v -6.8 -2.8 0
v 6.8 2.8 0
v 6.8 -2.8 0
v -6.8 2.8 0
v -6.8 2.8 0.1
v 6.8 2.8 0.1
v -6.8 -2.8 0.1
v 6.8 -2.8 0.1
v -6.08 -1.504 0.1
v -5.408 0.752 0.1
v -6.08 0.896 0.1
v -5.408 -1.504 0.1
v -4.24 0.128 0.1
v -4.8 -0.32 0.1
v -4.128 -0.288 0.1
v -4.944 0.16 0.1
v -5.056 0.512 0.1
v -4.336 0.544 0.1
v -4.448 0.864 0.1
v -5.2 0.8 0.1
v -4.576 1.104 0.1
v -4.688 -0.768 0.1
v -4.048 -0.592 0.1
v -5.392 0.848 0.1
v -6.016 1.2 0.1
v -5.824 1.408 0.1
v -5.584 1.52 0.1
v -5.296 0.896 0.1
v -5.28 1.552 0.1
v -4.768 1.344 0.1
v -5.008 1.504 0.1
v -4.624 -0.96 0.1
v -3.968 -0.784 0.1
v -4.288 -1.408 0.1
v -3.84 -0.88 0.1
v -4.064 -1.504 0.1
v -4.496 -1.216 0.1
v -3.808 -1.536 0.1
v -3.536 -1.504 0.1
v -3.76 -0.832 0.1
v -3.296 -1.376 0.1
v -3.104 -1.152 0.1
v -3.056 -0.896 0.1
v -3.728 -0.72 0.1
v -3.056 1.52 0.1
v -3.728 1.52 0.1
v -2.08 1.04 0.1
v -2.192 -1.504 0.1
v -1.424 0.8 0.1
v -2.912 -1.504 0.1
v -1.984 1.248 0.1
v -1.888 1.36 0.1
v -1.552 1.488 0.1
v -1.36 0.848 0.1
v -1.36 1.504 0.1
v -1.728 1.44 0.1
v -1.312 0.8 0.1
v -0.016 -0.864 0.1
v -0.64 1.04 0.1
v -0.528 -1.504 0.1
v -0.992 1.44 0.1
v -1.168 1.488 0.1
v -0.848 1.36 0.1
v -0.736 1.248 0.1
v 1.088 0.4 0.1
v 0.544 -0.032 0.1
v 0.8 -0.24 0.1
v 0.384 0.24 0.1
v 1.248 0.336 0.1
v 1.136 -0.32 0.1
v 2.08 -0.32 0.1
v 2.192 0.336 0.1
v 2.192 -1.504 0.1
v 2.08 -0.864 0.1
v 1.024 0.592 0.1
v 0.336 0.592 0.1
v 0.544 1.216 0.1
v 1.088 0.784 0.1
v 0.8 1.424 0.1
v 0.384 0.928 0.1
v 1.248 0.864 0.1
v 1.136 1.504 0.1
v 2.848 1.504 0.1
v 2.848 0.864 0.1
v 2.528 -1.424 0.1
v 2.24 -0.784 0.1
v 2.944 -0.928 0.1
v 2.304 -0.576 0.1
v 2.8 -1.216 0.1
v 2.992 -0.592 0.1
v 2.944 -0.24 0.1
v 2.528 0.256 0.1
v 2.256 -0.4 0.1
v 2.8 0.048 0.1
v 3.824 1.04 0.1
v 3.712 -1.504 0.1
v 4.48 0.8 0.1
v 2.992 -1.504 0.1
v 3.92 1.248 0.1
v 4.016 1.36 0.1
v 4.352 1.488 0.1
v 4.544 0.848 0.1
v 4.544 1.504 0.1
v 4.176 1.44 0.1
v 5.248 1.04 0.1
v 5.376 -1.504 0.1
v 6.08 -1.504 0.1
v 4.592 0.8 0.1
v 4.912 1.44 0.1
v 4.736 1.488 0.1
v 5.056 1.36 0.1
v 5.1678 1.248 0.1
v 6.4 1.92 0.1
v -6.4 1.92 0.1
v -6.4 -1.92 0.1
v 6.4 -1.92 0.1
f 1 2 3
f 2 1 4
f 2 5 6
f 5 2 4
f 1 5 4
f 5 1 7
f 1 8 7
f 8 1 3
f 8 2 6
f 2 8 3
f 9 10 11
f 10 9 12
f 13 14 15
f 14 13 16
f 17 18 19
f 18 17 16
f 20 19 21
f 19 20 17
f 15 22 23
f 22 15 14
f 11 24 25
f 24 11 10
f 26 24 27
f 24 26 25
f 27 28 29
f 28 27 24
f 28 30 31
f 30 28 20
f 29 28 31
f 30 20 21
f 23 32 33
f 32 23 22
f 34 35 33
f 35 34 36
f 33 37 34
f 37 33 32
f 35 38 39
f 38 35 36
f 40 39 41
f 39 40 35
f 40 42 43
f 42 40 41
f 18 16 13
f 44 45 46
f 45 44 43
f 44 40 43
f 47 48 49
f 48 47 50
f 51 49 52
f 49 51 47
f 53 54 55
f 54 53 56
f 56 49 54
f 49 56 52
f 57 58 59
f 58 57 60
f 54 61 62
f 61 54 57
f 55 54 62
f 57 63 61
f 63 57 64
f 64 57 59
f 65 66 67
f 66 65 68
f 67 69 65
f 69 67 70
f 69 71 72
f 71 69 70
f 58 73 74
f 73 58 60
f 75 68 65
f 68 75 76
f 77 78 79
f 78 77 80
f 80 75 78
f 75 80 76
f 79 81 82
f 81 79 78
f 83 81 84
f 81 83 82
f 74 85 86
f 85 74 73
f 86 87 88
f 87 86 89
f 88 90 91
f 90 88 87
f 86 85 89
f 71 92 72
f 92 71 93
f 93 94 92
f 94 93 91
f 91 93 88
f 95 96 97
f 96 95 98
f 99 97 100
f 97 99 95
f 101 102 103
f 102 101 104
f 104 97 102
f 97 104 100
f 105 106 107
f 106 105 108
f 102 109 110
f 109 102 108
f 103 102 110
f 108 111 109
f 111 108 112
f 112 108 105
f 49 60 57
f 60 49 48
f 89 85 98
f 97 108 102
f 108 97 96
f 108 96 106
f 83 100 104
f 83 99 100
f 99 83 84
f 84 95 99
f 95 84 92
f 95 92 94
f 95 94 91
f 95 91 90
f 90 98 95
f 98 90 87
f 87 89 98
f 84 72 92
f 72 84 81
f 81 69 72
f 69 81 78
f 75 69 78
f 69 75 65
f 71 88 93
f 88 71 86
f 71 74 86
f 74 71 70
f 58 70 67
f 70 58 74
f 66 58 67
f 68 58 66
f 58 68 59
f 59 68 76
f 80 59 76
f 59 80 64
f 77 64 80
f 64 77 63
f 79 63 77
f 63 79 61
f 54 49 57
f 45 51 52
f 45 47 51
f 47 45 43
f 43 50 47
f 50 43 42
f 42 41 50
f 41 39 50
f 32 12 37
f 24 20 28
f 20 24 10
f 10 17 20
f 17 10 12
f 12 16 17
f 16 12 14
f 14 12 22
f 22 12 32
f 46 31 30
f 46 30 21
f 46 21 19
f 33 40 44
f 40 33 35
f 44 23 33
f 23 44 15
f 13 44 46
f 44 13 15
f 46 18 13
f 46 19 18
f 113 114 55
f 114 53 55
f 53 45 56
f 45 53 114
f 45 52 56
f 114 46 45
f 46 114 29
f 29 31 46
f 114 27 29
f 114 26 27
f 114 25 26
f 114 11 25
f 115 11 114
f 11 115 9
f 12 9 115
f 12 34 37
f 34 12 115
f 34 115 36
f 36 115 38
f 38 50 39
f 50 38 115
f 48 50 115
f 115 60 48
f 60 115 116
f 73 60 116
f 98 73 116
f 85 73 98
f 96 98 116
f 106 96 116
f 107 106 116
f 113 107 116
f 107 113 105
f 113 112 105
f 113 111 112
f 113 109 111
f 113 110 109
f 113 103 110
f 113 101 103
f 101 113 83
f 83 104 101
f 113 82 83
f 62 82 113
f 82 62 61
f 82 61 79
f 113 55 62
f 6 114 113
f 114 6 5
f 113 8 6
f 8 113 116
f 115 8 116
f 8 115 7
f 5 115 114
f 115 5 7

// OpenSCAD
// file: ../p/logo-nasa.scad
use <../lib.scad>
function ldraw_lib__logo_nasa() = [
// 0 Logo NASA Worm Logo
// 0 Name: logo-nasa.dat
// 0 Author: Takeshi Takahashi [RainbowDolphin]
// 0 !LDRAW_ORG Primitive UPDATE 2022-06
// 0 !LICENSE Licensed under CC BY 2.0 and CC BY 4.0 : see CAreadme.txt
// 
// 0 BFC CERTIFY CCW
  [0,"BFC","CERTIFY"],
  [0,"BFC","CCW"],
// 
// 0 !HISTORY 2022-04-22 [RainbowDolphin] Pattern extracted and resized from 10202p02 by Orion Pobursky [OrionP]
// 0 !HISTORY 2022-12-20 [PTadmin] Official Update 2022-06
// 
// 
// 4 16 -38 0 -9.4 -33.8 0 -9.4 -33.8 0 4.7 -38 0 5.6
  [4,16,-38,0,-9.4,-33.8,0,-9.4,-33.8,0,4.7,-38,0,5.6],
// 4 16 -26.5 0 .8 -30.9 0 1 -30 0 -2 -25.8 0 -1.8
  [4,16,-26.5,0,.8,-30.9,0,1,-30,0,-2,-25.8,0,-1.8],
// 4 16 -31.6 0 3.2 -30.9 0 1 -27.1 0 3.4 -27.8 0 5.4
  [4,16,-31.6,0,3.2,-30.9,0,1,-27.1,0,3.4,-27.8,0,5.4],
// 4 16 -32.5 0 5 -31.6 0 3.2 -27.8 0 5.4 -28.6 0 6.9
  [4,16,-32.5,0,5,-31.6,0,3.2,-27.8,0,5.4,-28.6,0,6.9],
// 4 16 -25.8 0 -1.8 -30 0 -2 -29.3 0 -4.8 -25.3 0 -3.7
  [4,16,-25.8,0,-1.8,-30,0,-2,-29.3,0,-4.8,-25.3,0,-3.7],
// 4 16 -33.7 0 5.3 -37.6 0 7.5 -38 0 5.6 -33.8 0 4.7
  [4,16,-33.7,0,5.3,-37.6,0,7.5,-38,0,5.6,-33.8,0,4.7],
// 4 16 -36.4 0 8.8 -37.6 0 7.5 -33.7 0 5.3 -34.9 0 9.5
  [4,16,-36.4,0,8.8,-37.6,0,7.5,-33.7,0,5.3,-34.9,0,9.5],
// 4 16 -34.9 0 9.5 -33.7 0 5.3 -33.1 0 5.6 -33 0 9.7
  [4,16,-34.9,0,9.5,-33.7,0,5.3,-33.1,0,5.6,-33,0,9.7],
// 4 16 -33.1 0 5.6 -32.5 0 5 -29.8 0 8.4 -31.3 0 9.4
  [4,16,-33.1,0,5.6,-32.5,0,5,-29.8,0,8.4,-31.3,0,9.4],
// 3 16 -33 0 9.7 -33.1 0 5.6 -31.3 0 9.4
  [3,16,-33,0,9.7,-33.1,0,5.6,-31.3,0,9.4],
// 3 16 -29.8 0 8.4 -32.5 0 5 -28.6 0 6.9
  [3,16,-29.8,0,8.4,-32.5,0,5,-28.6,0,6.9],
// 4 16 -25.3 0 -3.7 -29.3 0 -4.8 -28.9 0 -6 -24.8 0 -4.9
  [4,16,-25.3,0,-3.7,-29.3,0,-4.8,-28.9,0,-6,-24.8,0,-4.9],
// 4 16 -26.8 0 -8.8 -25.4 0 -9.4 -24 0 -5.5 -24.8 0 -4.9
  [4,16,-26.8,0,-8.8,-25.4,0,-9.4,-24,0,-5.5,-24.8,0,-4.9],
// 4 16 -28.1 0 -7.6 -26.8 0 -8.8 -24.8 0 -4.9 -28.9 0 -6
  [4,16,-28.1,0,-7.6,-26.8,0,-8.8,-24.8,0,-4.9,-28.9,0,-6],
// 4 16 -24 0 -5.5 -25.4 0 -9.4 -23.8 0 -9.6 -22.1 0 -9.4
  [4,16,-24,0,-5.5,-25.4,0,-9.4,-23.8,0,-9.6,-22.1,0,-9.4],
// 4 16 -23.5 0 -5.2 -24 0 -5.5 -22.1 0 -9.4 -20.6 0 -8.6
  [4,16,-23.5,0,-5.2,-24,0,-5.5,-22.1,0,-9.4,-20.6,0,-8.6],
// 4 16 -23.5 0 -5.2 -20.6 0 -8.6 -19.4 0 -7.2 -19.1 0 -5.6
  [4,16,-23.5,0,-5.2,-20.6,0,-8.6,-19.4,0,-7.2,-19.1,0,-5.6],
// 3 16 -27.1 0 3.4 -30.9 0 1 -26.5 0 .8
  [3,16,-27.1,0,3.4,-30.9,0,1,-26.5,0,.8],
// 4 16 -19.1 0 9.5 -23.3 0 9.5 -23.3 0 -4.5 -19.1 0 -5.6
  [4,16,-19.1,0,9.5,-23.3,0,9.5,-23.3,0,-4.5,-19.1,0,-5.6],
// 3 16 -23.3 0 -4.5 -23.5 0 -5.2 -19.1 0 -5.6
  [3,16,-23.3,0,-4.5,-23.5,0,-5.2,-19.1,0,-5.6],
// 4 16 -13 0 6.5 -18.2 0 -9.4 -13.7 0 -9.4 -8.9 0 5
  [4,16,-13,0,6.5,-18.2,0,-9.4,-13.7,0,-9.4,-8.9,0,5],
// 4 16 -8.9 0 5 -11.8 0 8.5 -12.4 0 7.8 -13 0 6.5
  [4,16,-8.9,0,5,-11.8,0,8.5,-12.4,0,7.8,-13,0,6.5],
// 4 16 -9.7 0 9.3 -10.8 0 9 -8.5 0 5.3 -8.5 0 9.4
  [4,16,-9.7,0,9.3,-10.8,0,9,-8.5,0,5.3,-8.5,0,9.4],
// 4 16 -10.8 0 9 -11.8 0 8.5 -8.9 0 5 -8.5 0 5.3
  [4,16,-10.8,0,9,-11.8,0,8.5,-8.9,0,5,-8.5,0,5.3],
// 4 16 -3.3 0 -9.4 -.1 0 -5.4 -4 0 6.5 -8.2 0 5
  [4,16,-3.3,0,-9.4,-.1,0,-5.4,-4,0,6.5,-8.2,0,5],
// 4 16 -6.2 0 9 -7.3 0 9.3 -8.5 0 5.3 -8.2 0 5
  [4,16,-6.2,0,9,-7.3,0,9.3,-8.5,0,5.3,-8.2,0,5],
// 3 16 -8.5 0 9.4 -8.5 0 5.3 -7.3 0 9.3
  [3,16,-8.5,0,9.4,-8.5,0,5.3,-7.3,0,9.3],
// 4 16 -8.2 0 5 -4.6 0 7.8 -5.3 0 8.5 -6.2 0 9
  [4,16,-8.2,0,5,-4.6,0,7.8,-5.3,0,8.5,-6.2,0,9],
// 3 16 -4.6 0 7.8 -8.2 0 5 -4 0 6.5
  [3,16,-4.6,0,7.8,-8.2,0,5,-4,0,6.5],
// 4 16 6.8 0 2.5 2.4 0 1.5 3.4 0 -.2 5 0 -1.5
  [4,16,6.8,0,2.5,2.4,0,1.5,3.4,0,-.2,5,0,-1.5],
// 4 16 5 0 -1.5 7.1 0 -2 7.8 0 2.1 6.8 0 2.5
  [4,16,5,0,-1.5,7.1,0,-2,7.8,0,2.1,6.8,0,2.5],
// 4 16 7.8 0 2.1 7.1 0 -2 13 0 -2 13.7 0 2.1
  [4,16,7.8,0,2.1,7.1,0,-2,13,0,-2,13.7,0,2.1],
// 4 16 13 0 -5.4 -.1 0 -5.4 -3.3 0 -9.4 13.7 0 -9.4
  [4,16,13,0,-5.4,-.1,0,-5.4,-3.3,0,-9.4,13.7,0,-9.4],
// 4 16 2.4 0 1.5 6.8 0 2.5 6.4 0 3.7 2.1 0 3.7
  [4,16,2.4,0,1.5,6.8,0,2.5,6.4,0,3.7,2.1,0,3.7],
// 4 16 3.4 0 7.6 2.4 0 5.8 6.8 0 4.9 5 0 8.9
  [4,16,3.4,0,7.6,2.4,0,5.8,6.8,0,4.9,5,0,8.9],
// 4 16 2.4 0 5.8 2.1 0 3.7 6.4 0 3.7 6.8 0 4.9
  [4,16,2.4,0,5.8,2.1,0,3.7,6.4,0,3.7,6.8,0,4.9],
// 4 16 5 0 8.9 6.8 0 4.9 7.8 0 5.4 7.1 0 9.4
  [4,16,5,0,8.9,6.8,0,4.9,7.8,0,5.4,7.1,0,9.4],
// 4 16 17.8 0 9.4 7.1 0 9.4 7.8 0 5.4 17.8 0 5.4
  [4,16,17.8,0,9.4,7.1,0,9.4,7.8,0,5.4,17.8,0,5.4],
// 4 16 15.8 0 -8.9 14 0 -4.9 13 0 -5.4 13.7 0 -9.4
  [4,16,15.8,0,-8.9,14,0,-4.9,13,0,-5.4,13.7,0,-9.4],
// 4 16 18.4 0 -5.8 14.4 0 -3.6 14 0 -4.9 17.5 0 -7.6
  [4,16,18.4,0,-5.8,14.4,0,-3.6,14,0,-4.9,17.5,0,-7.6],
// 4 16 14.4 0 -3.6 18.4 0 -5.8 18.7 0 -3.7 18.4 0 -1.5
  [4,16,14.4,0,-3.6,18.4,0,-5.8,18.7,0,-3.7,18.4,0,-1.5],
// 3 16 14 0 -4.9 15.8 0 -8.9 17.5 0 -7.6
  [3,16,14,0,-4.9,15.8,0,-8.9,17.5,0,-7.6],
// 4 16 13 0 -2 14.1 0 -2.5 15.8 0 1.6 13.7 0 2.1
  [4,16,13,0,-2,14.1,0,-2.5,15.8,0,1.6,13.7,0,2.1],
// 4 16 17.5 0 .3 15.8 0 1.6 14.1 0 -2.5 18.4 0 -1.5
  [4,16,17.5,0,.3,15.8,0,1.6,14.1,0,-2.5,18.4,0,-1.5],
// 3 16 18.4 0 -1.5 14.1 0 -2.5 14.4 0 -3.6
  [3,16,18.4,0,-1.5,14.1,0,-2.5,14.4,0,-3.6],
// 4 16 23.9 0 6.5 18.7 0 -9.4 23.2 0 -9.4 28 0 5
  [4,16,23.9,0,6.5,18.7,0,-9.4,23.2,0,-9.4,28,0,5],
// 4 16 28 0 5 25.1 0 8.5 24.5 0 7.8 23.9 0 6.5
  [4,16,28,0,5,25.1,0,8.5,24.5,0,7.8,23.9,0,6.5],
// 4 16 27.2 0 9.3 26.1 0 9 28.4 0 5.3 28.4 0 9.4
  [4,16,27.2,0,9.3,26.1,0,9,28.4,0,5.3,28.4,0,9.4],
// 4 16 26.1 0 9 25.1 0 8.5 28 0 5 28.4 0 5.3
  [4,16,26.1,0,9,25.1,0,8.5,28,0,5,28.4,0,5.3],
// 4 16 33.6 0 -9.4 38 0 -9.4 32.8 0 6.5 28.7 0 5
  [4,16,33.6,0,-9.4,38,0,-9.4,32.8,0,6.5,28.7,0,5],
// 4 16 30.7 0 9 29.6 0 9.3 28.4 0 5.3 28.7 0 5
  [4,16,30.7,0,9,29.6,0,9.3,28.4,0,5.3,28.7,0,5],
// 3 16 28.4 0 9.4 28.4 0 5.3 29.6 0 9.3
  [3,16,28.4,0,9.4,28.4,0,5.3,29.6,0,9.3],
// 4 16 28.7 0 5 32.299 0 7.8 31.6 0 8.5 30.7 0 9
  [4,16,28.7,0,5,32.299,0,7.8,31.6,0,8.5,30.7,0,9],
// 3 16 32.299 0 7.8 28.7 0 5 32.8 0 6.5
  [3,16,32.299,0,7.8,28.7,0,5,32.8,0,6.5],
];
module ldraw_lib__logo_nasa(step=0, col=false, unit=2/5, alt=false, line=0.2, solid=!$preview)
    makepoly(ldraw_lib__logo_nasa(), step=step, col=col, unit=unit, alt=alt, line=line, solid=solid);
ldraw_lib__logo_nasa(line=0.2);
// file: ../p/box5-12.scad
use <../lib.scad>
function ldraw_lib__box5_12() = [
// 0 Box with 5 Faces without Any Edges
// 0 Name: box5-12.dat
// 0 Author: Chris Dee [cwdee]
// 0 !LDRAW_ORG Primitive UPDATE 2009-02
// 0 !LICENSE Licensed under CC BY 2.0 and CC BY 4.0 : see CAreadme.txt
// 
// 0 BFC CERTIFY CCW
  [0,"BFC","CERTIFY"],
  [0,"BFC","CCW"],
// 
// 0 !HISTORY 2009-09-03 [PTadmin] Official Update 2009-02
// 
// 
// 4 16 1 1 1 1 1 -1 -1 1 -1 -1 1 1
  [4,16,1,1,1,1,1,-1,-1,1,-1,-1,1,1],
// 4 16 -1 0 1 1 0 1 1 1 1 -1 1 1
  [4,16,-1,0,1,1,0,1,1,1,1,-1,1,1],
// 4 16 -1 0 -1 -1 0 1 -1 1 1 -1 1 -1
  [4,16,-1,0,-1,-1,0,1,-1,1,1,-1,1,-1],
// 4 16 1 0 -1 -1 0 -1 -1 1 -1 1 1 -1
  [4,16,1,0,-1,-1,0,-1,-1,1,-1,1,1,-1],
// 4 16 1 0 1 1 0 -1 1 1 -1 1 1 1
  [4,16,1,0,1,1,0,-1,1,1,-1,1,1,1],
// 0
];
module ldraw_lib__box5_12(step=0, col=false, unit=2/5, alt=false, line=0.2, solid=!$preview)
    makepoly(ldraw_lib__box5_12(), step=step, col=col, unit=unit, alt=alt, line=line, solid=solid);
ldraw_lib__box5_12(line=0.2);
// main file
use <../lib.scad>
use <../p/box5-12.scad>
use <../p/logo-nasa-bg.scad>
use <../p/logo-nasa.scad>
function ldraw_lib__163345f() = [
// 0 Sticker  0.7 x  1.7 with Red NASA Worm Logo
// 0 Name: 163345f.dat
// 0 Author: Takeshi Takahashi [RainbowDolphin]
// 0 !LDRAW_ORG Part UPDATE 2022-06
// 0 !LICENSE Licensed under CC BY 2.0 and CC BY 4.0 : see CAreadme.txt
// 
// 0 BFC CERTIFY CCW
  [0,"BFC","CERTIFY"],
  [0,"BFC","CCW"],
// 
// 0 !KEYWORDS Bricklink 1682stk01, Brickowl 849575, Launch pad, Rebrickable 163345
// 0 !KEYWORDS Set 1682, Space Shuttle
// 
// 0 !HISTORY 2022-12-20 [PTadmin] Official Update 2022-06
// 
// 
// 1 16 0 -0.25 0 17 0 0 0 0.25 0 0 0 7 box5-12.dat
  [1,16,0,-0.25,0,17,0,0,0,0.25,0,0,0,7, ldraw_lib__box5_12()],
// 0 BFC NOCLIP
  [0,"BFC","NOCLIP"],
// 1 4 0 -0.25 0 0.4 0 0 0 1 0 0 0 0.4 logo-nasa.dat
  [1,4,0,-0.25,0,0.4,0,0,0,1,0,0,0,0.4, ldraw_lib__logo_nasa()],
// 0 BFC CLIP
  [0,"BFC","CLIP"],
// 1 16 0 -0.25 0 0.4 0 0 0 1 0 0 0 0.4 logo-nasa-bg.dat
  [1,16,0,-0.25,0,0.4,0,0,0,1,0,0,0,0.4, ldraw_lib__logo_nasa_bg()],
// 4 16 17 -0.25 7 -17 -0.25 7 -16 -0.25 4.8 16 -0.25 4.8
  [4,16,17,-0.25,7,-17,-0.25,7,-16,-0.25,4.8,16,-0.25,4.8],
// 4 16 17 -0.25 -7 17 -0.25 7 16 -0.25 4.8 16 -0.25 -4.8
  [4,16,17,-0.25,-7,17,-0.25,7,16,-0.25,4.8,16,-0.25,-4.8],
// 4 16 -17 -0.25 -7 17 -0.25 -7 16 -0.25 -4.8 -16 -0.25 -4.8
  [4,16,-17,-0.25,-7,17,-0.25,-7,16,-0.25,-4.8,-16,-0.25,-4.8],
// 4 16 -17 -0.25 7 -17 -0.25 -7 -16 -0.25 -4.8 -16 -0.25 4.8
  [4,16,-17,-0.25,7,-17,-0.25,-7,-16,-0.25,-4.8,-16,-0.25,4.8],
];
module ldraw_lib__163345f(step=0, col=false, unit=2/5, alt=false, line=0.2, solid=!$preview)
    makepoly(ldraw_lib__163345f(), step=step, col=col, unit=unit, alt=alt, line=line, solid=solid);
ldraw_lib__163345f(line=0.2);
